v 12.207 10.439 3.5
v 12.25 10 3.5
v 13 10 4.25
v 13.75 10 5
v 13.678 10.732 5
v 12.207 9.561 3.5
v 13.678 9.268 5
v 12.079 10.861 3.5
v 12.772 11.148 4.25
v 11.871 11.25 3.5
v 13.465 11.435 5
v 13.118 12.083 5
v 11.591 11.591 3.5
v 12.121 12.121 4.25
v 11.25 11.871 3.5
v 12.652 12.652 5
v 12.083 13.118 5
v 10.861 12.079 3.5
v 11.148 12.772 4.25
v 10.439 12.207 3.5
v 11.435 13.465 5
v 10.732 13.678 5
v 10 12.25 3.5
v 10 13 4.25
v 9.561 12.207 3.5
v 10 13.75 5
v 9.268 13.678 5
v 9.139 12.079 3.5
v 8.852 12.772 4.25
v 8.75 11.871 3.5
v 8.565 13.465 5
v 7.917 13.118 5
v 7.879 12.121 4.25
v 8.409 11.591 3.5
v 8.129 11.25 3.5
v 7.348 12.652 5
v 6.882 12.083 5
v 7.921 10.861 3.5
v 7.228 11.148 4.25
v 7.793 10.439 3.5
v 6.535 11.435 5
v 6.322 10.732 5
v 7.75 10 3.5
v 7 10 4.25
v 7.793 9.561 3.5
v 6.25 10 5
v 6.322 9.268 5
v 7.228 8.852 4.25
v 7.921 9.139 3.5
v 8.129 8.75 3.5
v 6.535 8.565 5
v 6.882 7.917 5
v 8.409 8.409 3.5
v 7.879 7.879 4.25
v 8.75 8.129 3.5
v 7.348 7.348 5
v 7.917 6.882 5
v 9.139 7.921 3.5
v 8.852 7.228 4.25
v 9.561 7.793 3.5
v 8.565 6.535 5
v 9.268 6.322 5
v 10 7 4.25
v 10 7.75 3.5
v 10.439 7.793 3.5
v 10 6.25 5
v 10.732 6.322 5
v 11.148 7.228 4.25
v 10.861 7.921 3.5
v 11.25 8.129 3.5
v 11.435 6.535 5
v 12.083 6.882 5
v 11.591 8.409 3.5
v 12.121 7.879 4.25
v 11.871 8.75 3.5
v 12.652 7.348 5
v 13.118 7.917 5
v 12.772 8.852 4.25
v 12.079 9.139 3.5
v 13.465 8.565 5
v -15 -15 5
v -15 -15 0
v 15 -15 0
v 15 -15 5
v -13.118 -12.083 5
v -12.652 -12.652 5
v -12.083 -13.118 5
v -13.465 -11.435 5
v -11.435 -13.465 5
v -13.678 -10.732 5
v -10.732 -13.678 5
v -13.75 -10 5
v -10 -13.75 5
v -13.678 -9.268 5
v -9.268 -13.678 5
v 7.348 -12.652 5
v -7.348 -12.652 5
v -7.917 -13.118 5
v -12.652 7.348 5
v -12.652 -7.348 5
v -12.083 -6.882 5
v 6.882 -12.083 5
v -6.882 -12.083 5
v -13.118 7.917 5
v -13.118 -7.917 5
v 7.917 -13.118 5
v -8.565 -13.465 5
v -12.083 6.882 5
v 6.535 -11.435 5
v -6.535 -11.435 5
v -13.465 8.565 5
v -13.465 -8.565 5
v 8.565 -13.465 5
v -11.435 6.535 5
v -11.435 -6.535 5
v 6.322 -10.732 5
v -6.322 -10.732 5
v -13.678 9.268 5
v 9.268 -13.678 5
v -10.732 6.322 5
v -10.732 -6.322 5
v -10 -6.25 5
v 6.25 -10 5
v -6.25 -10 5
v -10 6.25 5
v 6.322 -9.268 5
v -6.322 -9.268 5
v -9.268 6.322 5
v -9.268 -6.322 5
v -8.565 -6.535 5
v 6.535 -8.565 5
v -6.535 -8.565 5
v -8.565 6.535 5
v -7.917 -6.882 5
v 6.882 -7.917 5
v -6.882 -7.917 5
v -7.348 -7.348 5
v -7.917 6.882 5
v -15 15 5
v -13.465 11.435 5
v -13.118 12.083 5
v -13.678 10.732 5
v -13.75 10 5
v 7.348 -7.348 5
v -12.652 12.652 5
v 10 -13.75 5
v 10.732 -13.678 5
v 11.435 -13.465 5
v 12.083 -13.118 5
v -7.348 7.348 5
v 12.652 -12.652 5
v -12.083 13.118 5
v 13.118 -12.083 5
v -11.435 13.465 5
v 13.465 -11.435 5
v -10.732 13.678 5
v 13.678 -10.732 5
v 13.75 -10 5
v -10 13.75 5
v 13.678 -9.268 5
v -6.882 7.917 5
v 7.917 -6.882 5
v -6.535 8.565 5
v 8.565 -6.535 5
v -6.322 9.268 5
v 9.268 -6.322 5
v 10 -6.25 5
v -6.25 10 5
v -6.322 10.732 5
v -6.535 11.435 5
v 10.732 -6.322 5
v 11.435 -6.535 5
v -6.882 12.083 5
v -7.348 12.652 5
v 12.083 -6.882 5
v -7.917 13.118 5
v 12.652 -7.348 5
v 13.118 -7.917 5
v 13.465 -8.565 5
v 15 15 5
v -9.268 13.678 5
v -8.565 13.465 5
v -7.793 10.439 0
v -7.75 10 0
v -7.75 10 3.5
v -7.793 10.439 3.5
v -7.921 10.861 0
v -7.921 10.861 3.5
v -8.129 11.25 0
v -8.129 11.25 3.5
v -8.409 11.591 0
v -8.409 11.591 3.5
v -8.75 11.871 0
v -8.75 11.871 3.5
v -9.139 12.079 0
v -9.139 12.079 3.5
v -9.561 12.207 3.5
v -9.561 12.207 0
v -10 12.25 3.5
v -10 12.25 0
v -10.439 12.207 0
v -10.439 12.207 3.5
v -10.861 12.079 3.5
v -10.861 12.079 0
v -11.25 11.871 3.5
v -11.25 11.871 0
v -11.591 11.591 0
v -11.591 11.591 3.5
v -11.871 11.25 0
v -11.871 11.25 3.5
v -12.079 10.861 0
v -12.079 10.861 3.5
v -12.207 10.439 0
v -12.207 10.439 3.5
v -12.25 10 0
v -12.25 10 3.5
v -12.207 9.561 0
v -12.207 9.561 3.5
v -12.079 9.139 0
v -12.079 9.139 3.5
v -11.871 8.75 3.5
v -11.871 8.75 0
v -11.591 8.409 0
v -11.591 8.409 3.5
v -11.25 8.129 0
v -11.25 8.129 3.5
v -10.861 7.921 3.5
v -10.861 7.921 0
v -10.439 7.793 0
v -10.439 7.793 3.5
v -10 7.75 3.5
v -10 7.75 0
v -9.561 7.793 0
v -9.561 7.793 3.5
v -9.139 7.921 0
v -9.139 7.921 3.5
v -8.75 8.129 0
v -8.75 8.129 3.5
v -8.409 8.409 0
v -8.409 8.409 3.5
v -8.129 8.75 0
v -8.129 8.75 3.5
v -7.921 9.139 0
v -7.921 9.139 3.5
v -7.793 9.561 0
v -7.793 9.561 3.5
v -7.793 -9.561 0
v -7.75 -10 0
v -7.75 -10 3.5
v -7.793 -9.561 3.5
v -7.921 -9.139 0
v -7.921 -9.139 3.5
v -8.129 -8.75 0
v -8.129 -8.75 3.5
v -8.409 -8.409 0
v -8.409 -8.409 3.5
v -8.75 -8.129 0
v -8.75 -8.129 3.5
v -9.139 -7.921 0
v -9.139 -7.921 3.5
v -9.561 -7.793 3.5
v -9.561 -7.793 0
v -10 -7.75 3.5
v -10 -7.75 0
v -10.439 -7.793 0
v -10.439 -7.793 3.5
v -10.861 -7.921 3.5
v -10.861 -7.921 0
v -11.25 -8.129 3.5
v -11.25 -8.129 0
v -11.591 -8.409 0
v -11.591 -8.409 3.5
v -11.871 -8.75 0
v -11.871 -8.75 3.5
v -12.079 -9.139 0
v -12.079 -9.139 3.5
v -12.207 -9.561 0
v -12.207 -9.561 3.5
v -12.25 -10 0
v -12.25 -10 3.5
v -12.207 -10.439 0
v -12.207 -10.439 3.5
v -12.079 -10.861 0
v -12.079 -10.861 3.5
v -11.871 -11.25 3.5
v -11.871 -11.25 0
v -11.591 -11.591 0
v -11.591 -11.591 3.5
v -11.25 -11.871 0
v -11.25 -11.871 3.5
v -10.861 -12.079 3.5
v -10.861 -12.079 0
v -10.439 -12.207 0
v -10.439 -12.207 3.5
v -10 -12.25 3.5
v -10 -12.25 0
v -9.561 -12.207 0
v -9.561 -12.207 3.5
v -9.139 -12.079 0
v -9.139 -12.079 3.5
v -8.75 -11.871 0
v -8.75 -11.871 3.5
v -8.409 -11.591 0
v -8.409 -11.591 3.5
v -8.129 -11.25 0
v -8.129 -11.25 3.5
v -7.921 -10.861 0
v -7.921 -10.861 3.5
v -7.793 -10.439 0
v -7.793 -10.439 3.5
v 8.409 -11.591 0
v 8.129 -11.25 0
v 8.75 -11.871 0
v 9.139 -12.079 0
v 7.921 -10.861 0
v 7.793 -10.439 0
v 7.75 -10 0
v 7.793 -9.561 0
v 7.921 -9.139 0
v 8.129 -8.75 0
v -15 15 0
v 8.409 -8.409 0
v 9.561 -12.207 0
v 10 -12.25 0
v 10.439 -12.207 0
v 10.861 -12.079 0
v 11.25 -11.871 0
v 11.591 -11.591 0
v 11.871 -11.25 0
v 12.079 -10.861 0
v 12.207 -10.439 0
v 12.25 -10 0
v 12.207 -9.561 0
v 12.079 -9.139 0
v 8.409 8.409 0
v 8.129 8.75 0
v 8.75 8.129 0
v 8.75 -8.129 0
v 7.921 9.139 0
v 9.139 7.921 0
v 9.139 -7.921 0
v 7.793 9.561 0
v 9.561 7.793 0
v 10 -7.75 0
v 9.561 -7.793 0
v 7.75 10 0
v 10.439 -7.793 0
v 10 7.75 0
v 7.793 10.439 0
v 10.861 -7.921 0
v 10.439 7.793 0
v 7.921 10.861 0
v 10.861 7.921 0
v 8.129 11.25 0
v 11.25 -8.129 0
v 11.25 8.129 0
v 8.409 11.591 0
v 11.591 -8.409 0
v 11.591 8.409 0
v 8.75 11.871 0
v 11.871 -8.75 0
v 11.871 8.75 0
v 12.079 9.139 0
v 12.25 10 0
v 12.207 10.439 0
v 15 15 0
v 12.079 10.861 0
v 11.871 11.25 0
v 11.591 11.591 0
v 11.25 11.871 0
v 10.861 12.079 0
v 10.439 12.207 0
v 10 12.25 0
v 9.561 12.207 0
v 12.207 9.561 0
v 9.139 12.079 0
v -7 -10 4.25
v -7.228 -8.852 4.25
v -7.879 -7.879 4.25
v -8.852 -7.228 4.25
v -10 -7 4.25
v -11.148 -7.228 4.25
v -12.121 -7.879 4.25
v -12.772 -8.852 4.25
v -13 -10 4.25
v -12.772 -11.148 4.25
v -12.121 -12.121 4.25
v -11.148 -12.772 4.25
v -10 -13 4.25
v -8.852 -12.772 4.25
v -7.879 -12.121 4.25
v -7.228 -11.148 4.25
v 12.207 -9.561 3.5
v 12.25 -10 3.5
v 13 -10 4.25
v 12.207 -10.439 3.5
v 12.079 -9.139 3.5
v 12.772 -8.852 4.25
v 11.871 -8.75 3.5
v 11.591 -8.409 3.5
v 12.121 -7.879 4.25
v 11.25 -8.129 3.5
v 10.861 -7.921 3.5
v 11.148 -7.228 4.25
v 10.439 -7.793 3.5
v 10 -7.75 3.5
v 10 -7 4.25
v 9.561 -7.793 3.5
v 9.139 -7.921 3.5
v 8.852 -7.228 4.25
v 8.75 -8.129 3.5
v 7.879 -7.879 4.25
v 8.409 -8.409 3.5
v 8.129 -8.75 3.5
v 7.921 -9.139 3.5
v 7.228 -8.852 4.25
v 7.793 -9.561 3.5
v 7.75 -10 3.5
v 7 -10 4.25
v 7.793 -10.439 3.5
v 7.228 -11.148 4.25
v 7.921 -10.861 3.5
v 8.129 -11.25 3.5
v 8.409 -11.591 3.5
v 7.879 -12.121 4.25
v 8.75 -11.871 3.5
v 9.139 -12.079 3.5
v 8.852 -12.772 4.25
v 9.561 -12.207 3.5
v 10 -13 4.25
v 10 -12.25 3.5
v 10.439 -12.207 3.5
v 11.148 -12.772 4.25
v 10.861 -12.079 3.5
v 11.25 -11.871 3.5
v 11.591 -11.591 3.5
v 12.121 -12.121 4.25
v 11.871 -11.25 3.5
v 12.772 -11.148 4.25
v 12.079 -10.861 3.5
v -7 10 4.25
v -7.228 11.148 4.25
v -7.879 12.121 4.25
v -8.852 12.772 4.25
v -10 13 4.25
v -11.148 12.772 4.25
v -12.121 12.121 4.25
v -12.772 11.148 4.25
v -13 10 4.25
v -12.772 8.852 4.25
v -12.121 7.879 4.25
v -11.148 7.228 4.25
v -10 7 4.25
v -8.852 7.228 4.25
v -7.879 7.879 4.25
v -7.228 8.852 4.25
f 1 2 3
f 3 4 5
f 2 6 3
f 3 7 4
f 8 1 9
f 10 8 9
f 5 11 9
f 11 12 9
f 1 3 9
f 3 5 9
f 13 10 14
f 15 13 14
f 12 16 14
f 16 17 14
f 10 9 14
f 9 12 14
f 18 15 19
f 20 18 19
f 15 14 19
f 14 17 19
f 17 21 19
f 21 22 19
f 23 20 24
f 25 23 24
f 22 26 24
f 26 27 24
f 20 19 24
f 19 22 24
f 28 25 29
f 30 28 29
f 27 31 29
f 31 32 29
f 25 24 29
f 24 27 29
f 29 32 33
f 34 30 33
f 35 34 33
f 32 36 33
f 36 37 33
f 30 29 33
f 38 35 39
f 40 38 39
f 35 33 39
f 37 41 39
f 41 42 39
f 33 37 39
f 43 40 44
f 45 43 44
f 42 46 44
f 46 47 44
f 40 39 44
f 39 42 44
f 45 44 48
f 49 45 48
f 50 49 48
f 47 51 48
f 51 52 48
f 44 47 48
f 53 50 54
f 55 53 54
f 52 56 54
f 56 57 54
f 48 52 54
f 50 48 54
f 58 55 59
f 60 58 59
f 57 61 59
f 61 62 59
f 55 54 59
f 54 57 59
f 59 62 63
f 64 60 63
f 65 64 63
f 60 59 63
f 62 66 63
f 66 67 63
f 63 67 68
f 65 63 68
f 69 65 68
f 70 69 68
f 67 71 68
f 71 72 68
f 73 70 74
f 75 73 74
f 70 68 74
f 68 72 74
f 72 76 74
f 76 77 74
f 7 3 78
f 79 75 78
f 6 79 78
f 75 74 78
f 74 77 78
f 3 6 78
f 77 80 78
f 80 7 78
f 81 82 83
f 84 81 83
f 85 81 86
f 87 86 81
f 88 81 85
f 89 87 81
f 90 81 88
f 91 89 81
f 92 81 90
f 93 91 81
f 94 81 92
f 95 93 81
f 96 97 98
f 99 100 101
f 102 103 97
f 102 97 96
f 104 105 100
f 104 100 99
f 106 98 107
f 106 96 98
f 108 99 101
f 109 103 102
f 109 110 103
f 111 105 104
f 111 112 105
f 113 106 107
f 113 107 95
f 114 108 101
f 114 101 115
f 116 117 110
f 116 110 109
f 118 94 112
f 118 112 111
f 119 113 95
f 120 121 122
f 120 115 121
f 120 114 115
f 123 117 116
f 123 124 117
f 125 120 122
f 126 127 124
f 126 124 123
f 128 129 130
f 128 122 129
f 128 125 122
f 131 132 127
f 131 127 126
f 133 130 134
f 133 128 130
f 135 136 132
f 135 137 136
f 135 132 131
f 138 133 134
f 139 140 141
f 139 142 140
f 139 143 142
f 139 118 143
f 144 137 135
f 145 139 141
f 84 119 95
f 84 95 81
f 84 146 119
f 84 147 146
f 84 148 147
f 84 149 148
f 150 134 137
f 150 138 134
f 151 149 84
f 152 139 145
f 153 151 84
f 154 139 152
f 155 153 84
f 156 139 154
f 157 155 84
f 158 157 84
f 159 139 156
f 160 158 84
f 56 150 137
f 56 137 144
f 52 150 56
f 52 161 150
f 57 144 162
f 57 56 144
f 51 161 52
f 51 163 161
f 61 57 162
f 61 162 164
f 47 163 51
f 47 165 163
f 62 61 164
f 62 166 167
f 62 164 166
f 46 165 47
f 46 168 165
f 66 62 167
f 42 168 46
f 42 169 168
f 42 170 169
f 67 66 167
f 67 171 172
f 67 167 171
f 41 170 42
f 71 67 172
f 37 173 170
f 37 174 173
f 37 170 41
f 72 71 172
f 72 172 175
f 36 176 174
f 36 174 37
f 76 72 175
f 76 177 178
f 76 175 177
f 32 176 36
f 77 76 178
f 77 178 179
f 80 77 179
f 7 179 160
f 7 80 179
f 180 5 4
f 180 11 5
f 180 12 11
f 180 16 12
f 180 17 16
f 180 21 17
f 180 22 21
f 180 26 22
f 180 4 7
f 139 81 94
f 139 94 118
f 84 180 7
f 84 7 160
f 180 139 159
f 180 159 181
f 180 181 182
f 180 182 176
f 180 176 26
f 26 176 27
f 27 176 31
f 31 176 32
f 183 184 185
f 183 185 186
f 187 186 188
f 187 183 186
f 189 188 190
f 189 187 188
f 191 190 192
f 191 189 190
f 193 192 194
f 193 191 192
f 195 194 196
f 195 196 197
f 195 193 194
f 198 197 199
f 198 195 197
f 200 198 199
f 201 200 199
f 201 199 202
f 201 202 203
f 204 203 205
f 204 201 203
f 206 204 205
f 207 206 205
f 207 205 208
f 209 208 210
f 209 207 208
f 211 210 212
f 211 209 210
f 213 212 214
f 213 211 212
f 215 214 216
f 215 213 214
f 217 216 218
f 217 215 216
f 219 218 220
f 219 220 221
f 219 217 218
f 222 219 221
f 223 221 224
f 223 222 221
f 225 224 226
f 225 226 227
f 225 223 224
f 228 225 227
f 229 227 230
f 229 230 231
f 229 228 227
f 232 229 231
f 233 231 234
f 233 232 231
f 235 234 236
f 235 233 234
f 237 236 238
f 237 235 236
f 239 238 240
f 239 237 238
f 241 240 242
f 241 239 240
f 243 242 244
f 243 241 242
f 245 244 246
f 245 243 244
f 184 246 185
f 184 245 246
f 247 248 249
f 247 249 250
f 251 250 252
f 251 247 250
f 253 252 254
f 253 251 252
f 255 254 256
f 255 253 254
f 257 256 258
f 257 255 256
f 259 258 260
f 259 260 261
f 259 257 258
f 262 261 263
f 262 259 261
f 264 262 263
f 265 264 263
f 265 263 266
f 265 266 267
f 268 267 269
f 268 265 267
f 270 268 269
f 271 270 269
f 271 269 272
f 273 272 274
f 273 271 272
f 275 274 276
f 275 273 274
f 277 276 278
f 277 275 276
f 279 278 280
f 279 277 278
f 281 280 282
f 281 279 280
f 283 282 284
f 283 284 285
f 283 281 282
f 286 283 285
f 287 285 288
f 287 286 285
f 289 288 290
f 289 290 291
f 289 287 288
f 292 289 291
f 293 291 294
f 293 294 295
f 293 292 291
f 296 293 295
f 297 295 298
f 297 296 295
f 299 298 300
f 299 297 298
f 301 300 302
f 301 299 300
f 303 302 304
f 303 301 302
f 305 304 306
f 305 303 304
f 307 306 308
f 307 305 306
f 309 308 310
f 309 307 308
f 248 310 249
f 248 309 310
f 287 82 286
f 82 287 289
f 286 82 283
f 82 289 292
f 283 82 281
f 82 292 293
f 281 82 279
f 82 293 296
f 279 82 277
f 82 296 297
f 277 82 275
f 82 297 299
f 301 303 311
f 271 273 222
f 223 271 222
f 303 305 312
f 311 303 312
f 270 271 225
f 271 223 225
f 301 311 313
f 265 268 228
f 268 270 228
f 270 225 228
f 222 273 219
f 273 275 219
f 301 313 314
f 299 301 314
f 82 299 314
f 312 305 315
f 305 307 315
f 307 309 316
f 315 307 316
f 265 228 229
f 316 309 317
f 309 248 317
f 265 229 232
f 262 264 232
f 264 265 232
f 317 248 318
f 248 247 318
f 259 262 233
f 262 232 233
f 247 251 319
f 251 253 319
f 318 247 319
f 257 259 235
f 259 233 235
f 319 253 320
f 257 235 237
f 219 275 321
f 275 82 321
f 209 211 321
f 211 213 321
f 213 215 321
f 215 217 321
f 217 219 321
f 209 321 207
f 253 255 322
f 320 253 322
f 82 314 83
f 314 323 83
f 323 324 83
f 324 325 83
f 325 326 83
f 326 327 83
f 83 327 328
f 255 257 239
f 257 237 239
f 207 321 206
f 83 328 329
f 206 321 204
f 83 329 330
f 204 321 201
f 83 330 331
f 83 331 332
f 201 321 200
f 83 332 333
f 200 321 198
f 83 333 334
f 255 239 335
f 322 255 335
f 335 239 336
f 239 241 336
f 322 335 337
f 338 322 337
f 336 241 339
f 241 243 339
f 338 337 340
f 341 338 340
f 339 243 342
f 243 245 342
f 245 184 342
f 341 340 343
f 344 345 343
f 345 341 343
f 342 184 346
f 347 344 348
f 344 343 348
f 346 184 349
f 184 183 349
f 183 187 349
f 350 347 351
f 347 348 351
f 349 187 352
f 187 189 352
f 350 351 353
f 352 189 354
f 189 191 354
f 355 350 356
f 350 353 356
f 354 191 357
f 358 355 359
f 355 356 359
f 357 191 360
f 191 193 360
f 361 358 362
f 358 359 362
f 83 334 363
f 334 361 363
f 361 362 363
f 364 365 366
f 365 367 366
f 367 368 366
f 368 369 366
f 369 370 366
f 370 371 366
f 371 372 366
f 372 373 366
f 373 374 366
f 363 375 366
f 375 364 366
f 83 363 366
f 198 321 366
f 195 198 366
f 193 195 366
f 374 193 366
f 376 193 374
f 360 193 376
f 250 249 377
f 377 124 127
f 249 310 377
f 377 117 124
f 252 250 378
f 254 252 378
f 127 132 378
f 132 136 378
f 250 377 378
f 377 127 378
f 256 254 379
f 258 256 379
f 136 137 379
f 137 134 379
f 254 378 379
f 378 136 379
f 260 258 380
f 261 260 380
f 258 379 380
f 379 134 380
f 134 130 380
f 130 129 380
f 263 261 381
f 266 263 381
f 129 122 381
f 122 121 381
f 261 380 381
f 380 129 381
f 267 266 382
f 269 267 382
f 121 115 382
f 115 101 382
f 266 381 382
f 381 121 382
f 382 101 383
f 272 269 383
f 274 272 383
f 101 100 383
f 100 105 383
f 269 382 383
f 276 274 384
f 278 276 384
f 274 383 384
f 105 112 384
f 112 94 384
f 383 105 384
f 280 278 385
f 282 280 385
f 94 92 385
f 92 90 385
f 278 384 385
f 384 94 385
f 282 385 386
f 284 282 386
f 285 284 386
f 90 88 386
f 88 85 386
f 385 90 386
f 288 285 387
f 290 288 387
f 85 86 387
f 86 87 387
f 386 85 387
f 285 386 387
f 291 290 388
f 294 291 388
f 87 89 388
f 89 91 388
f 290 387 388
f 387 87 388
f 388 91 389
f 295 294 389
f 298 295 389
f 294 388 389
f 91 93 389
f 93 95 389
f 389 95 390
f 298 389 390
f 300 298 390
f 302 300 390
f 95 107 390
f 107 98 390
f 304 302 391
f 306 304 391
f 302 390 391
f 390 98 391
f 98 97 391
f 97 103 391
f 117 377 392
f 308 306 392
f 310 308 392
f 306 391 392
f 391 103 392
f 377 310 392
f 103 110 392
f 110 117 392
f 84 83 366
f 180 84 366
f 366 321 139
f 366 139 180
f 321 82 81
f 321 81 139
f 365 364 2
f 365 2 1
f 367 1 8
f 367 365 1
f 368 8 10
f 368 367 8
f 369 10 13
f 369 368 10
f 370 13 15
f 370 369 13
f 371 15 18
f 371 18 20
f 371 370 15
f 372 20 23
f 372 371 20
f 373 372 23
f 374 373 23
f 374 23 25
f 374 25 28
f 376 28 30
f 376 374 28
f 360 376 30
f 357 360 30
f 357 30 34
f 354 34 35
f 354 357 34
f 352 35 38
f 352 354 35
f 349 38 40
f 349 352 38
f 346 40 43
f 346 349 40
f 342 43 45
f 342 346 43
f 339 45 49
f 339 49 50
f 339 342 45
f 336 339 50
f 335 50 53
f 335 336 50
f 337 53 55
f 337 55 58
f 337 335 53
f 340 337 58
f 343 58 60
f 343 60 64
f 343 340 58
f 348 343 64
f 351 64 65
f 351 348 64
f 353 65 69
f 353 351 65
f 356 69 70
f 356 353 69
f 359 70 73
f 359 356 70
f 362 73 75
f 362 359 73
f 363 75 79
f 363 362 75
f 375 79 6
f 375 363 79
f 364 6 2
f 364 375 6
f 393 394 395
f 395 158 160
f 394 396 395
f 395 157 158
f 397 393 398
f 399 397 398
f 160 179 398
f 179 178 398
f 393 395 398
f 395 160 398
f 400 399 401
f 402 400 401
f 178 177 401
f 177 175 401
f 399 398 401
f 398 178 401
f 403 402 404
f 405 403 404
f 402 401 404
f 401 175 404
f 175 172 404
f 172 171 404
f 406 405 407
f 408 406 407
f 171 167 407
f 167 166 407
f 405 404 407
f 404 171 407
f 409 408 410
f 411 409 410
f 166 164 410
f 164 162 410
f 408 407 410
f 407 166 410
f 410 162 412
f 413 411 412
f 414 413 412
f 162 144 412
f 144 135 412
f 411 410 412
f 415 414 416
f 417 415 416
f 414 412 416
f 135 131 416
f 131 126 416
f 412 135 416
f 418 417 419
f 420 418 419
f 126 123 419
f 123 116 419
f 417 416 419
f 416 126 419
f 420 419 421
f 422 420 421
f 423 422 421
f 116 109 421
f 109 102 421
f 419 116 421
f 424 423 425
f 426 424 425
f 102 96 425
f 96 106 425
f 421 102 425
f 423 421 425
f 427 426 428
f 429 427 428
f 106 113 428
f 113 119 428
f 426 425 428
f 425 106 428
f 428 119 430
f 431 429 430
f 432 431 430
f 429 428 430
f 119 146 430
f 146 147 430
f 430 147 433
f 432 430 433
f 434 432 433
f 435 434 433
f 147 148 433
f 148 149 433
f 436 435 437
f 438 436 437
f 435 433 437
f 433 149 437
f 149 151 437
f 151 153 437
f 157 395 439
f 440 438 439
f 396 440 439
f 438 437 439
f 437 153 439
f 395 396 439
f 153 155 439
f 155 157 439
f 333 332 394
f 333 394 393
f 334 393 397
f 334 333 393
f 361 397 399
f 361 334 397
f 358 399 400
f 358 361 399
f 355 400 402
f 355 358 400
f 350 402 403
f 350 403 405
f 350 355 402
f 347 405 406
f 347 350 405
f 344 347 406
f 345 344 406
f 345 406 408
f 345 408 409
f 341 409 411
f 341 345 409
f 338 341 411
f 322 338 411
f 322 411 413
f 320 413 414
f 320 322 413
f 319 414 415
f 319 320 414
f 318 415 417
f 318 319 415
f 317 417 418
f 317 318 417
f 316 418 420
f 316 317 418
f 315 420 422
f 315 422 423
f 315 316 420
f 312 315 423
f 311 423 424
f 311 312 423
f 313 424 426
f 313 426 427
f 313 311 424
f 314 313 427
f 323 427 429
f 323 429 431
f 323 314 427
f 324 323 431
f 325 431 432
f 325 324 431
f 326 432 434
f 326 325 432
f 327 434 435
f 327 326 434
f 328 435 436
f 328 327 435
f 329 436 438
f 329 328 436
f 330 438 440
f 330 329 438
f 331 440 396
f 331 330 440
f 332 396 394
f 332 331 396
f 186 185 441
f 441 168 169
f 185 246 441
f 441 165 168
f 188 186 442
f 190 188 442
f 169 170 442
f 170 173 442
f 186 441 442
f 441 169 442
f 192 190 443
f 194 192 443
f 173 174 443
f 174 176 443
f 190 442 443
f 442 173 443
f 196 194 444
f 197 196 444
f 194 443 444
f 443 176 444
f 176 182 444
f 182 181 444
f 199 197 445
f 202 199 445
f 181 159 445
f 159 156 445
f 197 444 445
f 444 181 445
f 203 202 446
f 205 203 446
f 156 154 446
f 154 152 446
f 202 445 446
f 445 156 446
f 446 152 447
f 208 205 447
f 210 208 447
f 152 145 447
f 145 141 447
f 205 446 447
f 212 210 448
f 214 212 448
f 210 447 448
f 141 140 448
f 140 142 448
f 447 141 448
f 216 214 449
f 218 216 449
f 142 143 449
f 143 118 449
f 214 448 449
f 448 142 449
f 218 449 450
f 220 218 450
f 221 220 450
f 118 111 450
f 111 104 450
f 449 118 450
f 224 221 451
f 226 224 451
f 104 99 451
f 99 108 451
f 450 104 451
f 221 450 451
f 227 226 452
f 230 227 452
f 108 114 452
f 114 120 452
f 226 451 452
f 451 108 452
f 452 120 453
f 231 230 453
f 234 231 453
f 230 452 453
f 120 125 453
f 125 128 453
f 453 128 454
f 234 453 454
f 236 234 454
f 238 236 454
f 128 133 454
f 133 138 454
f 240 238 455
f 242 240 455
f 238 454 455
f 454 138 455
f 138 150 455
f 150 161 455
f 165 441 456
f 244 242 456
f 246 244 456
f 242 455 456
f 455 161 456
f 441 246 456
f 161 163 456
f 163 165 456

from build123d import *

# Parameters (mm, degrees)
F0_W     = 30
F0_H     = 30
F0_R     = 2.25
F1_DEPTH = 5
F2_SIZE  = 1.5


with BuildPart() as f1:
    # F0 (on Top) → F1 (new body)
    with BuildSketch(Plane.XY):
        Rectangle(F0_W, F0_H)
        with Locations((-10, -10)):
            Circle(F0_R, mode=Mode.SUBTRACT)
        with Locations((10, -10)):
            Circle(F0_R, mode=Mode.SUBTRACT)
        with Locations((-10, 10)):
            Circle(F0_R, mode=Mode.SUBTRACT)
        with Locations((10, 10)):
            Circle(F0_R, mode=Mode.SUBTRACT)
    extrude(amount=F1_DEPTH)

    # F2
    f2_edges = [f1.edges().sort_by_distance(p)[0] for p in [
        (-12.25, -10, 5),
        (-12.25, 10, 5),
        (7.75, -10, 5),
        (7.75, 10, 5),
    ]]
    chamfer(f2_edges, length=F2_SIZE)


solid = f1.part
